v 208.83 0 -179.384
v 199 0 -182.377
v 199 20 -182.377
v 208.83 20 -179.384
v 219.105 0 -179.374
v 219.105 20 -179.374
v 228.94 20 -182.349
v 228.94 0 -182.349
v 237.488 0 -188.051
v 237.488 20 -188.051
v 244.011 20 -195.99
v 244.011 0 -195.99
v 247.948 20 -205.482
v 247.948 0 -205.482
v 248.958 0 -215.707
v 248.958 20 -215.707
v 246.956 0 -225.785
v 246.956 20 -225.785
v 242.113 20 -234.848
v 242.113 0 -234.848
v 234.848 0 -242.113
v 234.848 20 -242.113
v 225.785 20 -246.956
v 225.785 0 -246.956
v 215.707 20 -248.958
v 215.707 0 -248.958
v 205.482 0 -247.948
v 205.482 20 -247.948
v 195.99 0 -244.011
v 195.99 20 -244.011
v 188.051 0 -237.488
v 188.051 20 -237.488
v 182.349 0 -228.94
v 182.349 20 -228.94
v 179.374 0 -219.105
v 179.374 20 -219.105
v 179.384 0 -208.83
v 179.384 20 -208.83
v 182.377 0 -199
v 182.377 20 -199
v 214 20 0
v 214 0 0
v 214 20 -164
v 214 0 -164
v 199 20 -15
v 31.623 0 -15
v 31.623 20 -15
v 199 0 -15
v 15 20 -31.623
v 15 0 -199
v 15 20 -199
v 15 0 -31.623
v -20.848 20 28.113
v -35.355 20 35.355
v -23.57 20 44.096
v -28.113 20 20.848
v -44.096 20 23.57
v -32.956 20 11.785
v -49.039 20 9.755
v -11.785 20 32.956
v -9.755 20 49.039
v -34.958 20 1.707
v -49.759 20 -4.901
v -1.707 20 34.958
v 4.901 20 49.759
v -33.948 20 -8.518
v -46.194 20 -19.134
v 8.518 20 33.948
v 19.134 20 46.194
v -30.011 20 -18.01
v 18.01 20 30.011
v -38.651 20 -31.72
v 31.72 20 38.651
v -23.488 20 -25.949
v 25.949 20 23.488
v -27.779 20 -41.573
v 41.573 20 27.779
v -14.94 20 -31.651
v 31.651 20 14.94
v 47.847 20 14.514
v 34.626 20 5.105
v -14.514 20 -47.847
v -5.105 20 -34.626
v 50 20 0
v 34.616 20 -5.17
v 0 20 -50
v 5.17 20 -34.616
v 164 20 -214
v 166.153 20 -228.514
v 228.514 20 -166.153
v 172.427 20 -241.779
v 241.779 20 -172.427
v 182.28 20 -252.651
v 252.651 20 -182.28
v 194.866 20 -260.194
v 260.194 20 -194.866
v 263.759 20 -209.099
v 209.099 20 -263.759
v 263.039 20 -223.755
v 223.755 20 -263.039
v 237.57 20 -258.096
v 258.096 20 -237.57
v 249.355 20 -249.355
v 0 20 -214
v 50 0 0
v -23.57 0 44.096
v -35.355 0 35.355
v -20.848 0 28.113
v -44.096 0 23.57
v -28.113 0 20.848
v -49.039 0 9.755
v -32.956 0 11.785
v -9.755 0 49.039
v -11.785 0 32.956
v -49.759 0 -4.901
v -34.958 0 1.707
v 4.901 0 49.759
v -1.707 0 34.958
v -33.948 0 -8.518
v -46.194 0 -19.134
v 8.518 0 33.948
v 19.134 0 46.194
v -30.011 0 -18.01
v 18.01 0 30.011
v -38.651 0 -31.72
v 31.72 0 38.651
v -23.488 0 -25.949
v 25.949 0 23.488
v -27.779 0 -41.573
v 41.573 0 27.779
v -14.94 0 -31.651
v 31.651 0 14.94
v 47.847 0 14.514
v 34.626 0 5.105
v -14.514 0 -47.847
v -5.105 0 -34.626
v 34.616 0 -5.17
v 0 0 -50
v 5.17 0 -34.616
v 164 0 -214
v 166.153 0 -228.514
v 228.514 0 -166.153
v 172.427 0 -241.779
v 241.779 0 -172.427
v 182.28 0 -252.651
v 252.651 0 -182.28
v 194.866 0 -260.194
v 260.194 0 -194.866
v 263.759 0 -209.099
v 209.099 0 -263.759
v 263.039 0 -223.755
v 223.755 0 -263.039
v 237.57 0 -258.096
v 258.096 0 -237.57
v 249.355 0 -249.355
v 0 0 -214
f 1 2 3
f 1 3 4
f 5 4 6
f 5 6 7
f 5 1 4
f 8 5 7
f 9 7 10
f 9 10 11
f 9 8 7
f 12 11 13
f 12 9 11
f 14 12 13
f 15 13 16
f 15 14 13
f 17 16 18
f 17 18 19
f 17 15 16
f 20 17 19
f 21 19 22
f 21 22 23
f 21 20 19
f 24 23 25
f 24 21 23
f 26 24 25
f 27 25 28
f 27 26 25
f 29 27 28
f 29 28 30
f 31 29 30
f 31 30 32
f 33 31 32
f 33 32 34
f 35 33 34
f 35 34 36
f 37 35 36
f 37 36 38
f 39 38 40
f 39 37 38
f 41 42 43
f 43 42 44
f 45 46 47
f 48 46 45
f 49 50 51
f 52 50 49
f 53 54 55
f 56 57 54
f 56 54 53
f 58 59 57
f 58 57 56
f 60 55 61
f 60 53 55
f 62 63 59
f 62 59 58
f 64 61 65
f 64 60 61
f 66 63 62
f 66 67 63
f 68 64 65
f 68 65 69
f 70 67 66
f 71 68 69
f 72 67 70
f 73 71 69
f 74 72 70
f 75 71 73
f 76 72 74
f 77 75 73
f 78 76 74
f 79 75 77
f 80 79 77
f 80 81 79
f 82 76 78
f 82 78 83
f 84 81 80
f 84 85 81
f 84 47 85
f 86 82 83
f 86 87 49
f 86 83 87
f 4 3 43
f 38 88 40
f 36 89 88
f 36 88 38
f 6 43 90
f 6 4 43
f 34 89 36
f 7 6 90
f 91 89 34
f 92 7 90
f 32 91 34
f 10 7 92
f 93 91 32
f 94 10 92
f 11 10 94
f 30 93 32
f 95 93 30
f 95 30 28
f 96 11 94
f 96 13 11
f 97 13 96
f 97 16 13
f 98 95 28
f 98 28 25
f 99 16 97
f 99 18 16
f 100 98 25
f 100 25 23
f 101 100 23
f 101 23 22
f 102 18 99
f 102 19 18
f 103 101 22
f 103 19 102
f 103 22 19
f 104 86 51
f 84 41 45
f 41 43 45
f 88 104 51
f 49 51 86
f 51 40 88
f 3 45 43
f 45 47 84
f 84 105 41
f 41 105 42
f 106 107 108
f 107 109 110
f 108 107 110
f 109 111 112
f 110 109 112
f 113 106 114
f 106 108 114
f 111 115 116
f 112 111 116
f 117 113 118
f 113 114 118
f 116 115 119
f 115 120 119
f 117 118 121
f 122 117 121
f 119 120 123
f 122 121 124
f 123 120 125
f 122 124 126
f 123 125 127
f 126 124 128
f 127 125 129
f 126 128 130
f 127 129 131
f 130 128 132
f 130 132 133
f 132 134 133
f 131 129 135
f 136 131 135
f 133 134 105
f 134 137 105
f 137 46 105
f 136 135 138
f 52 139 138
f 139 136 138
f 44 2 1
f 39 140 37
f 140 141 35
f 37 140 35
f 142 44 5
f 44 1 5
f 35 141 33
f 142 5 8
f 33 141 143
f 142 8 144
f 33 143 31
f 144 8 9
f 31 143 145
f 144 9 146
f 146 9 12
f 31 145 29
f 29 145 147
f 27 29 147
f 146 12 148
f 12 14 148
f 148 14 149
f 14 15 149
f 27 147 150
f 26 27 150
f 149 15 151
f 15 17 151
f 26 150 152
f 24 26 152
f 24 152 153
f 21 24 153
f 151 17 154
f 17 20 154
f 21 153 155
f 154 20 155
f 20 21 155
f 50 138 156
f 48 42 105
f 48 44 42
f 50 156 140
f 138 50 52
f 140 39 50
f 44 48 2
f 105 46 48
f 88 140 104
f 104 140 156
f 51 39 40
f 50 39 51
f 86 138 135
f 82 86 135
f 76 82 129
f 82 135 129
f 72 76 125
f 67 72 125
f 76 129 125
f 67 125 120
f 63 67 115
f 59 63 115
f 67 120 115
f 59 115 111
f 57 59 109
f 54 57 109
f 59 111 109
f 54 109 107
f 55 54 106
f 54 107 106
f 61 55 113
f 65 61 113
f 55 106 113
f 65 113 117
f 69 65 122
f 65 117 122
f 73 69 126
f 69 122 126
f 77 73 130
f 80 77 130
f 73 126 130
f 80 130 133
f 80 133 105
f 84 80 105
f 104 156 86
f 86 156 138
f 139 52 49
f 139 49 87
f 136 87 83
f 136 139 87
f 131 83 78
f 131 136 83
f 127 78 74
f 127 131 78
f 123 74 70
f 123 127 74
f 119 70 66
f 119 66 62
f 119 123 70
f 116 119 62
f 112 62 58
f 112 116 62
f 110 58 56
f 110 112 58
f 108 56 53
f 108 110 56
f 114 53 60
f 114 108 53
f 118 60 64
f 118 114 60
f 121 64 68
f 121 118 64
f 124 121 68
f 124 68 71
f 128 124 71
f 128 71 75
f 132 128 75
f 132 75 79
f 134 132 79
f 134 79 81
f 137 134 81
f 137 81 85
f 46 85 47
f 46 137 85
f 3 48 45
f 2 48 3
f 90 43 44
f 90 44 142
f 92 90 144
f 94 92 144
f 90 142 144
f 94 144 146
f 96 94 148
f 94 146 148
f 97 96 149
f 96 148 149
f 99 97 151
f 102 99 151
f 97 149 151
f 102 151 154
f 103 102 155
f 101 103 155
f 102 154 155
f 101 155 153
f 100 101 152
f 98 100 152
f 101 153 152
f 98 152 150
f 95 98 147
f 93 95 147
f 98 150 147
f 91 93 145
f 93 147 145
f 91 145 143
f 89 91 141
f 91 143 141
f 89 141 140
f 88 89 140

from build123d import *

# Parameters (mm, degrees)
BOSS_EXTRUDE1_DEPTH = 20


with BuildPart() as part:
    # Sketch1 → Boss-Extrude1 (new body)
    with BuildSketch(Plane(origin=(0, 0, 0), x_dir=(1, 0, 0), z_dir=(0, 1, 0))):
        with BuildLine():
            Line((0, 214), (0, 50))
            ThreePointArc((0, 50), (-35.355339059, -35.355339059), (50, 0))
            Line((50, 0), (214, 0))
            Line((214, 0), (214, 164))
            ThreePointArc((214, 164), (249.355339059, 249.355339059), (164, 214))
            Line((164, 214), (0, 214))
        make_face()
        with BuildLine():
            Line((15, 199), (15, 31.622776602))
            ThreePointArc((15, 31.622776602), (-24.748737342, -24.748737342), (31.622776602, 15))
            Line((31.622776602, 15), (199, 15))
            Line((199, 15), (199, 182.377223398))
            ThreePointArc((199, 182.377223398), (238.748737342, 238.748737342), (182.377223398, 199))
            Line((182.377223398, 199), (15, 199))
        make_face(mode=Mode.SUBTRACT)
    extrude(amount=BOSS_EXTRUDE1_DEPTH)


solid = part.part
